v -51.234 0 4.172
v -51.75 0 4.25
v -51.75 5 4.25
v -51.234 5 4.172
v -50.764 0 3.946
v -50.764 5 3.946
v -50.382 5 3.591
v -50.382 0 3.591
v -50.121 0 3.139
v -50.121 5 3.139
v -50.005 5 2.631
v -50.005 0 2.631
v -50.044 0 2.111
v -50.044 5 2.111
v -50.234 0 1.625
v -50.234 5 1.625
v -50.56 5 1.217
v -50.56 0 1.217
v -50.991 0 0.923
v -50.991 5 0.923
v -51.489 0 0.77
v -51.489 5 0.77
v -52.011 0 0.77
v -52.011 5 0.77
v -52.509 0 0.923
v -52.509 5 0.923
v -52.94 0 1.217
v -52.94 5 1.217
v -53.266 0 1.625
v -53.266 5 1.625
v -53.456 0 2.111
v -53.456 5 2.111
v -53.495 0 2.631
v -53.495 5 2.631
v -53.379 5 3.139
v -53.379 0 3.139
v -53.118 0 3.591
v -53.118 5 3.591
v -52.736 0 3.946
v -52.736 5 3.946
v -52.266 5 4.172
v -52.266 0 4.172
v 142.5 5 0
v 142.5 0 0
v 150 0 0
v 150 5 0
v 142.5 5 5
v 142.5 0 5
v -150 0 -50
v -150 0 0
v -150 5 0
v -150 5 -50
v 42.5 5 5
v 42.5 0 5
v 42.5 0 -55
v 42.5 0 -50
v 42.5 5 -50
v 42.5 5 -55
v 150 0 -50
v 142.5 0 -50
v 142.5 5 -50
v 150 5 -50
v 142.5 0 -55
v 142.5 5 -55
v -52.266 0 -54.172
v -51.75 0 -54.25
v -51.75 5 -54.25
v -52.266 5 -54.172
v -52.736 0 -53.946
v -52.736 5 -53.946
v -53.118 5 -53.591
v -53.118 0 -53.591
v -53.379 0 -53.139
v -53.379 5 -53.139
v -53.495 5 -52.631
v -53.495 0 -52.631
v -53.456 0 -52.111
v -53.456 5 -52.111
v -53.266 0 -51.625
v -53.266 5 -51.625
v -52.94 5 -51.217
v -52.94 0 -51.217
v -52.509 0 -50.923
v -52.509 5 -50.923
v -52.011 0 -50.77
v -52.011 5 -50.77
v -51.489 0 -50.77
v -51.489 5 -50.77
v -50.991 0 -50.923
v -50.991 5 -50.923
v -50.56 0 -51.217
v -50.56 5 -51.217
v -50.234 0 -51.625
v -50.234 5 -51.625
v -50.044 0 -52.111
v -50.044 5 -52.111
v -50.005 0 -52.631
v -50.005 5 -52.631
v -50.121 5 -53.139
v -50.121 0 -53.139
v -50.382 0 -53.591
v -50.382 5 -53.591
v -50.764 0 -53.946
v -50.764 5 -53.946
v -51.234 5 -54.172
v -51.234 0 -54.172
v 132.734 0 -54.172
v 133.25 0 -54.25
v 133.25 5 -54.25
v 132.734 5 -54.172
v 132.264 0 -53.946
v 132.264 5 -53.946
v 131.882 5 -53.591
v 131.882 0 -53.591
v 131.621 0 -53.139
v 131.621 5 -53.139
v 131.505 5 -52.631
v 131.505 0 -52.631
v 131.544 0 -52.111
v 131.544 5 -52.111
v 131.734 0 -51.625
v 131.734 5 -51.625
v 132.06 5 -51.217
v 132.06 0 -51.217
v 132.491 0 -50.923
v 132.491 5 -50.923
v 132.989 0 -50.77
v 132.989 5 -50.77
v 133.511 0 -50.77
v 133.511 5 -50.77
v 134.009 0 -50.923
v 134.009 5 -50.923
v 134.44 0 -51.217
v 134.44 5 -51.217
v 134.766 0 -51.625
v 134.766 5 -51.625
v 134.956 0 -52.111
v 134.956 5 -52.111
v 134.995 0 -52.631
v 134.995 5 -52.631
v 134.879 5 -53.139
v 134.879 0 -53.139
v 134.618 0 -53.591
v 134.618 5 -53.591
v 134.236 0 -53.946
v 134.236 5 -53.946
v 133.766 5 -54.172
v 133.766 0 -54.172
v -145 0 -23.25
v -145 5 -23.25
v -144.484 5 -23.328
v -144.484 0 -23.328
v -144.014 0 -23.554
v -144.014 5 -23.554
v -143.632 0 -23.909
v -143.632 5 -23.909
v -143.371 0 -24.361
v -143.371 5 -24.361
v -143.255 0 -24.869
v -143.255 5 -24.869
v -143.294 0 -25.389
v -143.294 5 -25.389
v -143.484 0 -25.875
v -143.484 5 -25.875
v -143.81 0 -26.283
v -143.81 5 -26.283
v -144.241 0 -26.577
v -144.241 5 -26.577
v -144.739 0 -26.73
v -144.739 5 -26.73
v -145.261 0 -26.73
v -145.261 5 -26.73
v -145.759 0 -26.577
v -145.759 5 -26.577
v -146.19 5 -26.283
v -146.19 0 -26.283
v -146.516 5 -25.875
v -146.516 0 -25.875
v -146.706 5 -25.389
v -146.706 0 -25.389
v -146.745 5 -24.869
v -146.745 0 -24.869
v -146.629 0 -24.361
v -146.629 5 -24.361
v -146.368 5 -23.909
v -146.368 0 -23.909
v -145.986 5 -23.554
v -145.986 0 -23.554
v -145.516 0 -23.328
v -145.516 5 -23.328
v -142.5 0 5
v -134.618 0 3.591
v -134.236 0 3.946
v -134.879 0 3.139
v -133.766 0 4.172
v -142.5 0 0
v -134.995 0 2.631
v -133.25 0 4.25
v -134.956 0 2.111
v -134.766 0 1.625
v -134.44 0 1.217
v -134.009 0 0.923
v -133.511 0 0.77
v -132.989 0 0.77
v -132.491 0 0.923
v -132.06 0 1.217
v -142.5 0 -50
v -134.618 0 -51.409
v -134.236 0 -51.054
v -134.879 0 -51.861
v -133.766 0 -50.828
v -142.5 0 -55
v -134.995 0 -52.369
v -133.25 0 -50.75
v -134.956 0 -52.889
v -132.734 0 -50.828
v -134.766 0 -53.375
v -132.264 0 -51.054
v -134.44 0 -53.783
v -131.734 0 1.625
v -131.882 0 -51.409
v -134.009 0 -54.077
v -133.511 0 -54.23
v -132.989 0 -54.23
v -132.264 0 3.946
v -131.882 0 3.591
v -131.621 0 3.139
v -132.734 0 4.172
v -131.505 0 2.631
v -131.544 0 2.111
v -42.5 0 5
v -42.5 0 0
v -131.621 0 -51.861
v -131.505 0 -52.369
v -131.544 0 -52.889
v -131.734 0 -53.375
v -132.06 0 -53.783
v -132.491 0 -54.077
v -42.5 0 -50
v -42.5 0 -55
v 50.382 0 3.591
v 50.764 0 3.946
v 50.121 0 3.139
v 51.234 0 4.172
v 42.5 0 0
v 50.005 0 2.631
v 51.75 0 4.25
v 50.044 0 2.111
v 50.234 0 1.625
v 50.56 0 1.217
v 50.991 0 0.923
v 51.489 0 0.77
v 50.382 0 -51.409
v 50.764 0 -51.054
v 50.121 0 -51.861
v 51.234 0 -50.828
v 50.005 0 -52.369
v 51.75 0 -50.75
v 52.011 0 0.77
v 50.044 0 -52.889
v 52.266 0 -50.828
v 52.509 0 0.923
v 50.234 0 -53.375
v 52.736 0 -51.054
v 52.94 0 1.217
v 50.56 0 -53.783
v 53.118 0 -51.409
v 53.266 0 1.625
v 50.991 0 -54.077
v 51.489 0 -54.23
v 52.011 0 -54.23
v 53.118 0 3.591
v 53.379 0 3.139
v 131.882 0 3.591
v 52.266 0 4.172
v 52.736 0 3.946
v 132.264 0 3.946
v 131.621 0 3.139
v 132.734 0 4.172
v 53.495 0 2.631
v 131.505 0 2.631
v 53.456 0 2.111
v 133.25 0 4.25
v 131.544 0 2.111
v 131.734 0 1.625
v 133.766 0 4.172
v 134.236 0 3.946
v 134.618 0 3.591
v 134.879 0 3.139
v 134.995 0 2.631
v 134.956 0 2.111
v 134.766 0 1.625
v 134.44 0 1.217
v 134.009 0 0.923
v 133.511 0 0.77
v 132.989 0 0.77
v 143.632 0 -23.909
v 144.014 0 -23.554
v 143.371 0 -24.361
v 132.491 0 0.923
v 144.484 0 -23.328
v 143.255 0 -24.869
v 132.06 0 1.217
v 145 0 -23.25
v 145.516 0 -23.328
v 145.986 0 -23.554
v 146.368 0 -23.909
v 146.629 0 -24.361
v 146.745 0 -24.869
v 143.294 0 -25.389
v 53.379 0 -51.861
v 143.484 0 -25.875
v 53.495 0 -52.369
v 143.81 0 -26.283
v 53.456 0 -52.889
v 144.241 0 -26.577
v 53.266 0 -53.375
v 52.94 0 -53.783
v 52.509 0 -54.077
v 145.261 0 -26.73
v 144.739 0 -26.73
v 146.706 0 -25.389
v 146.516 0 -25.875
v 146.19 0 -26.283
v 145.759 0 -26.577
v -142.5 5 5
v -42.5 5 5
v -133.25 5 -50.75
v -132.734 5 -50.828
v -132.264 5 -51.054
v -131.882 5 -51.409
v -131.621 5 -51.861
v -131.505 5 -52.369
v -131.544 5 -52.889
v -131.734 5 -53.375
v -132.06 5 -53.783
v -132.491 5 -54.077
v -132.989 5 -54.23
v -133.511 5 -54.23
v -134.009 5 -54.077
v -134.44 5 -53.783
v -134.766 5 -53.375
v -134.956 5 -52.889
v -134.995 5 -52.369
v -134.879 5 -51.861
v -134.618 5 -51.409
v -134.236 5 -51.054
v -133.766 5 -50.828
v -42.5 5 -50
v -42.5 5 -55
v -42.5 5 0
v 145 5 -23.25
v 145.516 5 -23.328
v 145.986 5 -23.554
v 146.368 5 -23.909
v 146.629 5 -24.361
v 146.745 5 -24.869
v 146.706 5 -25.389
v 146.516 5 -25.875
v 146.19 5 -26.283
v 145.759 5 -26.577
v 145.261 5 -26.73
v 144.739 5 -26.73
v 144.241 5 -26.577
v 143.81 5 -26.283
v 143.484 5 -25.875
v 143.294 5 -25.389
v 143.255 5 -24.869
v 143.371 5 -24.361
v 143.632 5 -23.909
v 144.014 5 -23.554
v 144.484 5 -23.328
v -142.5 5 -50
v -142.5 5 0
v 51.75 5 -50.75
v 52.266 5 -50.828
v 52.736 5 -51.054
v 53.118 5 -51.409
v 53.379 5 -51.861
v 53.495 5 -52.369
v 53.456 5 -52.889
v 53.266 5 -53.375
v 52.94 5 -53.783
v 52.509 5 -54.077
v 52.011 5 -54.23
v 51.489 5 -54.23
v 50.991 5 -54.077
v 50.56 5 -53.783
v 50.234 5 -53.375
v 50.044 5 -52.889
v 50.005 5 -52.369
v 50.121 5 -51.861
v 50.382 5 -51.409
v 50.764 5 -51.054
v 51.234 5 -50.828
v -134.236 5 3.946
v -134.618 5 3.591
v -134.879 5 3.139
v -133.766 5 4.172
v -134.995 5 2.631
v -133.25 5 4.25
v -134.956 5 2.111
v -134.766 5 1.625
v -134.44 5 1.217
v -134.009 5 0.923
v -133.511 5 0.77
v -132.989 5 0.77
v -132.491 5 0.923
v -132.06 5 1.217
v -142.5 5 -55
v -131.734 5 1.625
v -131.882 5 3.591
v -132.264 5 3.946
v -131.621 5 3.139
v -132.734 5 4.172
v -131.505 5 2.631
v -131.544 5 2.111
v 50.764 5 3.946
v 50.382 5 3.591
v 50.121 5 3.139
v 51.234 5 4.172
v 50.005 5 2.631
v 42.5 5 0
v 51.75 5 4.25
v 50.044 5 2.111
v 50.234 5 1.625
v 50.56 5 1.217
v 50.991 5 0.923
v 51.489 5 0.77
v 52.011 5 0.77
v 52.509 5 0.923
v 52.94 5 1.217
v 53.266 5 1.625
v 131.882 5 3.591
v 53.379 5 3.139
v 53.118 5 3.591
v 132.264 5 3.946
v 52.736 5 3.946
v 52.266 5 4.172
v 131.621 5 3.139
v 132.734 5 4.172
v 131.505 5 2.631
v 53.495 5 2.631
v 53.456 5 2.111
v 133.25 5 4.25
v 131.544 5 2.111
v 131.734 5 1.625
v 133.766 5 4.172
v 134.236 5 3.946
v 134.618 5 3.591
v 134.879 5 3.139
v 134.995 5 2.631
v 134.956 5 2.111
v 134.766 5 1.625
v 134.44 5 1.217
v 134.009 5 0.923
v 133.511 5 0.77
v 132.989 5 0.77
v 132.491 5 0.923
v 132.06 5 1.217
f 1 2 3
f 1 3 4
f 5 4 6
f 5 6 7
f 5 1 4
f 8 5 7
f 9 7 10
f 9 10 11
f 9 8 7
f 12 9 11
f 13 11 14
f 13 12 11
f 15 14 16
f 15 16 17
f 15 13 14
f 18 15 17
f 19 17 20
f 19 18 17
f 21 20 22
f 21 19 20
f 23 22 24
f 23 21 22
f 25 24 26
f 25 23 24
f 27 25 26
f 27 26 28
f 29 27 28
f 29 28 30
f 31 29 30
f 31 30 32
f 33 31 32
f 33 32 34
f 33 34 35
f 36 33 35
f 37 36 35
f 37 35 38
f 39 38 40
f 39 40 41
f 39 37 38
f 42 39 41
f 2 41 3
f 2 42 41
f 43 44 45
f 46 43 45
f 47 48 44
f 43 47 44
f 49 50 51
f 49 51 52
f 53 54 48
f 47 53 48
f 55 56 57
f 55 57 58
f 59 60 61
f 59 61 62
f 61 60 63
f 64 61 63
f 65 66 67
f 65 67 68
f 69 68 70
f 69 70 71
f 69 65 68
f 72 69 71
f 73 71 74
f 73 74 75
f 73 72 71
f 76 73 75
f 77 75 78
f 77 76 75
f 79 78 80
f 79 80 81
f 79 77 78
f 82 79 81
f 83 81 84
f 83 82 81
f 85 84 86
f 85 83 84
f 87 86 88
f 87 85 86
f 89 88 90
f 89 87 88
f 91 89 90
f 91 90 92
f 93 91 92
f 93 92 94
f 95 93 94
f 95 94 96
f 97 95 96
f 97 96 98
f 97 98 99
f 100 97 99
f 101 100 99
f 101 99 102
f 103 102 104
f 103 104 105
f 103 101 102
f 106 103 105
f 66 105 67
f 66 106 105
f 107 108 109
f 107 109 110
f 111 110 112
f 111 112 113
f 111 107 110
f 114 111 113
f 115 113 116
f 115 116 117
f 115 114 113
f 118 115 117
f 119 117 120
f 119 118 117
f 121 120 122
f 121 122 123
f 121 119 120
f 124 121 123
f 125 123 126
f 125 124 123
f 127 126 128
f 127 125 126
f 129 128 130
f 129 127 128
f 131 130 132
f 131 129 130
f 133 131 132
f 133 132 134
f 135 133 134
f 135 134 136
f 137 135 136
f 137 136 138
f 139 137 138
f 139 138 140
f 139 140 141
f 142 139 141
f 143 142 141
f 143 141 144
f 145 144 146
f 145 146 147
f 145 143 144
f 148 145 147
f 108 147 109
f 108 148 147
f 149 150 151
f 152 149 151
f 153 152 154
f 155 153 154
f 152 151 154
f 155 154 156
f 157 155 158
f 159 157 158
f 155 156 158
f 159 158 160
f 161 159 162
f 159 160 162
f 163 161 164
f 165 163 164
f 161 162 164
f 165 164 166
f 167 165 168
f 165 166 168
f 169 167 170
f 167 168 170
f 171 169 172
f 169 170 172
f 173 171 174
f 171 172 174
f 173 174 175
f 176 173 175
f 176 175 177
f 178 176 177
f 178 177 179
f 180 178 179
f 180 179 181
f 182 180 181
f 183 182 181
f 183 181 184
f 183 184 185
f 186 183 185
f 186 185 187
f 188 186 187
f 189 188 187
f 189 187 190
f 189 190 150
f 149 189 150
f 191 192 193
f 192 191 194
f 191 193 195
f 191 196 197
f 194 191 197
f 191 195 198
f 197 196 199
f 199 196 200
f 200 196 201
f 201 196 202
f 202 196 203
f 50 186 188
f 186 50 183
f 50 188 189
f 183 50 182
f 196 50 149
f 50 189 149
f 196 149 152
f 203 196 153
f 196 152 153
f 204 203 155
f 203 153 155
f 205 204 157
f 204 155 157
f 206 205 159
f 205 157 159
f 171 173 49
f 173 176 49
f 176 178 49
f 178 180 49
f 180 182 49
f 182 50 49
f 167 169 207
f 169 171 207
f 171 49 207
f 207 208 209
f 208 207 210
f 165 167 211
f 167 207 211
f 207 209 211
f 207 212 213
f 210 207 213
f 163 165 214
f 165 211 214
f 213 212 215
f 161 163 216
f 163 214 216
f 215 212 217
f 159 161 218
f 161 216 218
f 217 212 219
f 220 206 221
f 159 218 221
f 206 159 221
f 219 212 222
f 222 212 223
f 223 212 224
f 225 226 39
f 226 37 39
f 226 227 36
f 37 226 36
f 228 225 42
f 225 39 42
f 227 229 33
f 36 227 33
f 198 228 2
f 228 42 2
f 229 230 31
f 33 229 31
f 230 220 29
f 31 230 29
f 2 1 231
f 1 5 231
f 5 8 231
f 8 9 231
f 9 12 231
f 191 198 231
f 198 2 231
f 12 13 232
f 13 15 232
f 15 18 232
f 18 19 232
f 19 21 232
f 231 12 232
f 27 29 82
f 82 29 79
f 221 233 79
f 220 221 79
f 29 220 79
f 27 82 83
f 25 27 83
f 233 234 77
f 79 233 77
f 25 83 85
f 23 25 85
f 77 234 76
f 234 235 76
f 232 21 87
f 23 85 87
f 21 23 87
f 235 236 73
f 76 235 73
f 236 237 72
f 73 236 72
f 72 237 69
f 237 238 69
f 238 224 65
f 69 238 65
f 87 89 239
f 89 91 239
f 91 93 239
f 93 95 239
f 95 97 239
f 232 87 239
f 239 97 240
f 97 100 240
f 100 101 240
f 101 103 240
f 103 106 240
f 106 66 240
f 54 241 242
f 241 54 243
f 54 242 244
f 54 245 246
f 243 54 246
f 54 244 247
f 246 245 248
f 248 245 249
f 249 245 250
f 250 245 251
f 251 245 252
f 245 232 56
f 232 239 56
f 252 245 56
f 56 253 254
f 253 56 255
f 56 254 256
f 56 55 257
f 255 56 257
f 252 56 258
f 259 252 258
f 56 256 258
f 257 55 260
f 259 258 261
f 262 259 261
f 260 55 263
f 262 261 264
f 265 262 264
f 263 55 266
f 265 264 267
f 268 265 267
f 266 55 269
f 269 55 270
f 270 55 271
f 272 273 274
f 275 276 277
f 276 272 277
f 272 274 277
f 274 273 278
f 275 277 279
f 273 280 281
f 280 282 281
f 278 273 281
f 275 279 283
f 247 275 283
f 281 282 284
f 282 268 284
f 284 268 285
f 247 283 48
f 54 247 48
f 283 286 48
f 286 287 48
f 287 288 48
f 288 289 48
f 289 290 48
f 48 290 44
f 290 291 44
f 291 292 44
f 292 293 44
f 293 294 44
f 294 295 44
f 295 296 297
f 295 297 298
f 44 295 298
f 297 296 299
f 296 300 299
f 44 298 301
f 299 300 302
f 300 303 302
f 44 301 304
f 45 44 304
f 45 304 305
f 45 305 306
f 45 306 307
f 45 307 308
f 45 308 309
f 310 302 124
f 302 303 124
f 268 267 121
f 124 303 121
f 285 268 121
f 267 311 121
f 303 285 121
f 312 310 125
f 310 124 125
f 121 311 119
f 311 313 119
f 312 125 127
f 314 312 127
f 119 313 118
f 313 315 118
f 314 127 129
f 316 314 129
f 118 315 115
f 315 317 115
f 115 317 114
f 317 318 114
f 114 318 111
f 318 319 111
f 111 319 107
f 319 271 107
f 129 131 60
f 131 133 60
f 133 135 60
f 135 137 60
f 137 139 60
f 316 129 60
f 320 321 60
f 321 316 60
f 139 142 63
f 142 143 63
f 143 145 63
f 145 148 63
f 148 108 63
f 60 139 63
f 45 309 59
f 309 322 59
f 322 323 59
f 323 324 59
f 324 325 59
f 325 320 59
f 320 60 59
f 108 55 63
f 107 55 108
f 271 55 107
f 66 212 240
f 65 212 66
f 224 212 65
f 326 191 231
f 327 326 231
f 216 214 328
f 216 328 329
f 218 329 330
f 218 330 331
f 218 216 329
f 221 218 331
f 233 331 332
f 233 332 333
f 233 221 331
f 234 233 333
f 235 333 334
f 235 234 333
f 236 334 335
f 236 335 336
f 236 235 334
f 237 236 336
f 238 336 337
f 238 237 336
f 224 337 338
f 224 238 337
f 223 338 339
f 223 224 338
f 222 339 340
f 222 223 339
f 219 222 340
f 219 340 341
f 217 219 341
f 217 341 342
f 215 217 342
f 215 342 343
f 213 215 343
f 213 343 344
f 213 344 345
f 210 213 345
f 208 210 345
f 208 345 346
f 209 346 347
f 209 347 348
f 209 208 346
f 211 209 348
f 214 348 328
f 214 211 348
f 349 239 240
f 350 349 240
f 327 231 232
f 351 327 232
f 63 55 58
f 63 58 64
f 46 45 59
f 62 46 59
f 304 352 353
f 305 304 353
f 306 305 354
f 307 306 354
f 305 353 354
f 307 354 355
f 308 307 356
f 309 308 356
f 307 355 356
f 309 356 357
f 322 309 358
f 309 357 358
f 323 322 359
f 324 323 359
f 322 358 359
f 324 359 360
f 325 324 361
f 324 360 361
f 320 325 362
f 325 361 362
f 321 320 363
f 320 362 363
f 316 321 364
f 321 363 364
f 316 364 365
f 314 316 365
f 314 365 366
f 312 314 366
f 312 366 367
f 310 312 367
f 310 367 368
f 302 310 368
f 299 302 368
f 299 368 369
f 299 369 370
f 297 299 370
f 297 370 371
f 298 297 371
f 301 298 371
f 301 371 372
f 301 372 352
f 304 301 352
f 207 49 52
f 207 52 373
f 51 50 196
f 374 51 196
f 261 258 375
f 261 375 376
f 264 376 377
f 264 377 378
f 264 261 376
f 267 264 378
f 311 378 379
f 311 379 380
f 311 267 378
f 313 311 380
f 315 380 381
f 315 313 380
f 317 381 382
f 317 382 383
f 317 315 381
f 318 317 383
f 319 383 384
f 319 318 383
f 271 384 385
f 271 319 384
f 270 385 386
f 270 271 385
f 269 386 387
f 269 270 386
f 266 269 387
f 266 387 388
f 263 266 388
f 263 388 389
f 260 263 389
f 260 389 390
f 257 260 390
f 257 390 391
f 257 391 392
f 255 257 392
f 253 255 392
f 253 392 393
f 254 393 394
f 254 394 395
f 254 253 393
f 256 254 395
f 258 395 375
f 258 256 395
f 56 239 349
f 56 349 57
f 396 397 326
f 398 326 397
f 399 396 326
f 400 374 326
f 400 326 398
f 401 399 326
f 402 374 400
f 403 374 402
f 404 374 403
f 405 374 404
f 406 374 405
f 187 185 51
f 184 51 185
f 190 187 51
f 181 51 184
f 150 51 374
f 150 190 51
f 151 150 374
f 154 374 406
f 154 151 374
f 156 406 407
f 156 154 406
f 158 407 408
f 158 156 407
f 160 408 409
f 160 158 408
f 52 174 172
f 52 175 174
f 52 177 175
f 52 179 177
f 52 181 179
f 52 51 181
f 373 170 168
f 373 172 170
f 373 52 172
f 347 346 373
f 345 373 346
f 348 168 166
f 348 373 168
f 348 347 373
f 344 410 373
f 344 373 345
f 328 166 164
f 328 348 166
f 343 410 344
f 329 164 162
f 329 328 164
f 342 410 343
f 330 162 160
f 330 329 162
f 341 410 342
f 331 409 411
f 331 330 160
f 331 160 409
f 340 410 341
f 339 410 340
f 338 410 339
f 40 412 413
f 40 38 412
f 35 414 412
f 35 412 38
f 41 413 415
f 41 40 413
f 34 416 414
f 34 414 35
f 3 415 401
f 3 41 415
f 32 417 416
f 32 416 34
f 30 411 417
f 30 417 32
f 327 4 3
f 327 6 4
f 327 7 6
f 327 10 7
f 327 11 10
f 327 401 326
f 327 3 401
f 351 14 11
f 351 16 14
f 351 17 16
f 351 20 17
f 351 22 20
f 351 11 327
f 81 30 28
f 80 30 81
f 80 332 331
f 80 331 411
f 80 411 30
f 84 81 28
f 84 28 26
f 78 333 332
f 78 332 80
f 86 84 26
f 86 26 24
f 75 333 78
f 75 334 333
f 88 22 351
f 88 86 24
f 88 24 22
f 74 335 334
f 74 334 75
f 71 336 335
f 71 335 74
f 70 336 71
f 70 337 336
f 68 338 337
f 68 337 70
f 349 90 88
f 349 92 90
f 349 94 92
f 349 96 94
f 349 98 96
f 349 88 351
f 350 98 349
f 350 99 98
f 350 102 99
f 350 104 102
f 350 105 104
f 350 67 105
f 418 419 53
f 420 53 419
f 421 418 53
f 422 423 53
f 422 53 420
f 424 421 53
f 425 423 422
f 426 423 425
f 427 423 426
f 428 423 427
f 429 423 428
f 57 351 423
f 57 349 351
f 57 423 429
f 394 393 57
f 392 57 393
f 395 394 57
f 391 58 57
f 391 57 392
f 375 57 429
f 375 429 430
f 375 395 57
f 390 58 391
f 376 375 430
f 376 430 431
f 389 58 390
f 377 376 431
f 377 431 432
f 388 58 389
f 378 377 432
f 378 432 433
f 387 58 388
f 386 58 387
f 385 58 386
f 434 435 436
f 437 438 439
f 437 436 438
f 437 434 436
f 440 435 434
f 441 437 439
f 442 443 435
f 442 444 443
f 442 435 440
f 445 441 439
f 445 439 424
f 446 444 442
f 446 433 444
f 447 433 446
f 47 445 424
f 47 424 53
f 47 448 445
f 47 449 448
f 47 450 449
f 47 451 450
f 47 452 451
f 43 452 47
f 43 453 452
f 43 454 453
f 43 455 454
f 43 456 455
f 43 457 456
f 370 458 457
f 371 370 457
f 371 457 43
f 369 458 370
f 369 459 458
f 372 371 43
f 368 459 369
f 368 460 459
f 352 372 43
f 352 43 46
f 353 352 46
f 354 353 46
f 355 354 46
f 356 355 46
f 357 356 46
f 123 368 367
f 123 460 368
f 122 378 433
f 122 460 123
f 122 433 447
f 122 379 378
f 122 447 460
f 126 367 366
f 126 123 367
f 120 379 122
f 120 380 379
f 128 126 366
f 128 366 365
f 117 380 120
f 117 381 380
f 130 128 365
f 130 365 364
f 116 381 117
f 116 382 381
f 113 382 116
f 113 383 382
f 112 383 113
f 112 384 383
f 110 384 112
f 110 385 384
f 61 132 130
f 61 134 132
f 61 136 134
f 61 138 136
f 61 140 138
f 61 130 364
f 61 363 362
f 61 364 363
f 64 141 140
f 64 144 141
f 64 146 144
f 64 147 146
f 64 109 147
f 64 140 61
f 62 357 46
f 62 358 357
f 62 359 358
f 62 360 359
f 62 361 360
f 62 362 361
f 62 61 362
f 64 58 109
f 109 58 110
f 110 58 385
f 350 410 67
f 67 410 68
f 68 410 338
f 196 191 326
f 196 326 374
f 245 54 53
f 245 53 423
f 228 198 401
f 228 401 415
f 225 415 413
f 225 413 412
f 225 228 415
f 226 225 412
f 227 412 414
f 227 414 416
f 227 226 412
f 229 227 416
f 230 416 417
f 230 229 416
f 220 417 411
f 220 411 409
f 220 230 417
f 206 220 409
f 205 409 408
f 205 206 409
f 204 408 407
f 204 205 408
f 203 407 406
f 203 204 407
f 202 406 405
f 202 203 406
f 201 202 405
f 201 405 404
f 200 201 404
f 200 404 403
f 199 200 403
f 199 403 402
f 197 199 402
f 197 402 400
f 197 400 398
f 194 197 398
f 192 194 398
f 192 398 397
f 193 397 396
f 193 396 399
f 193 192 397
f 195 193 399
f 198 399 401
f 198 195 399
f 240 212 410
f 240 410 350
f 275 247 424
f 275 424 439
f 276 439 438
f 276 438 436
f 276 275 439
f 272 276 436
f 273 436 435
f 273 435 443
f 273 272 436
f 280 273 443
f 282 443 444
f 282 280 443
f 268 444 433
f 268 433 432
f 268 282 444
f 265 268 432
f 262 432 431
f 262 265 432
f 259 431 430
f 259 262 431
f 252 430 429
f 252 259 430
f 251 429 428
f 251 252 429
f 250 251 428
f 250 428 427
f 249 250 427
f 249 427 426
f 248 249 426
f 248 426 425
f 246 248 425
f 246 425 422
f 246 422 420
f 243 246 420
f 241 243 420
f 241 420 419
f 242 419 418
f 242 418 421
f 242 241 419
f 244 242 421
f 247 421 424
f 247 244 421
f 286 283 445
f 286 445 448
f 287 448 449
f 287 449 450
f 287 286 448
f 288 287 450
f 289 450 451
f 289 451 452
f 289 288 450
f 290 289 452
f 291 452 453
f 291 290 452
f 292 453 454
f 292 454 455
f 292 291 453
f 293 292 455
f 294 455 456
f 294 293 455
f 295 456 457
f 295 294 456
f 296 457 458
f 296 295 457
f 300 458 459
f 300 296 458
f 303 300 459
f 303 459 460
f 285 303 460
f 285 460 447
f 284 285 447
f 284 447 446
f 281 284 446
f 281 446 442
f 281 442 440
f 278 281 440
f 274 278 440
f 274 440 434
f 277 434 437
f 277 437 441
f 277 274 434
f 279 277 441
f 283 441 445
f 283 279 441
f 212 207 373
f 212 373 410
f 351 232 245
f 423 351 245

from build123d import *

# Parameters (mm, degrees)
SKETCH1_W           = 100
SKETCH1_H           = 5
SKETCH1_R           = 1.75
SKETCH1_W_2         = 300
SKETCH1_H_2         = 50
BOSS_EXTRUDE1_DEPTH = 5
SKETCH2_R           = 1.75
CUT_EXTRUDE1_DEPTH  = 10


with BuildPart() as part:
    # Sketch1 → Boss-Extrude1 (new body)
    # profile 1 of 5: a face of its own
    with BuildSketch(Plane(origin=(0, 0, 0), x_dir=(1, 0, 0), z_dir=(0, 1, 0))):
        with Locations((-92.5, -2.5)):
            Rectangle(SKETCH1_W, SKETCH1_H)
        with Locations(Location((-51.75, -2.5, 0), (0, 0, 270))):
            Circle(SKETCH1_R, mode=Mode.SUBTRACT)
        with Locations(Location((-133.25, -2.5, 0), (0, 0, 270))):
            Circle(SKETCH1_R, mode=Mode.SUBTRACT)
    # profile 2 of 5: a face of its own
    with BuildSketch(Plane(origin=(0, 0, 0), x_dir=(1, 0, 0), z_dir=(0, 1, 0))):
        with Locations((0, 25)):
            Rectangle(SKETCH1_W_2, SKETCH1_H_2)
    # profile 3 of 5: a face of its own
    with BuildSketch(Plane(origin=(0, 0, 0), x_dir=(1, 0, 0), z_dir=(0, 1, 0))):
        with Locations((92.5, -2.5)):
            Rectangle(SKETCH1_W, SKETCH1_H)
        with Locations(Location((51.75, -2.5, 0), (0, 0, 270))):
            Circle(SKETCH1_R, mode=Mode.SUBTRACT)
        with Locations(Location((133.25, -2.5, 0), (0, 0, 270))):
            Circle(SKETCH1_R, mode=Mode.SUBTRACT)
    # profile 4 of 5: a face of its own
    with BuildSketch(Plane(origin=(0, 0, 0), x_dir=(1, 0, 0), z_dir=(0, 1, 0))):
        with Locations((92.5, 52.5)):
            Rectangle(SKETCH1_W, SKETCH1_H)
        with Locations(Location((133.25, 52.5, 0), (0, 0, 90))):
            Circle(SKETCH1_R, mode=Mode.SUBTRACT)
        with Locations(Location((51.75, 52.5, 0), (0, 0, 270))):
            Circle(SKETCH1_R, mode=Mode.SUBTRACT)
    # profile 5 of 5: a face of its own
    with BuildSketch(Plane(origin=(0, 0, 0), x_dir=(1, 0, 0), z_dir=(0, 1, 0))):
        with Locations((-92.5, 52.5)):
            Rectangle(SKETCH1_W, SKETCH1_H)
        with Locations(Location((-51.75, 52.5, 0), (0, 0, 90))):
            Circle(SKETCH1_R, mode=Mode.SUBTRACT)
        with Locations(Location((-133.25, 52.5, 0), (0, 0, 270))):
            Circle(SKETCH1_R, mode=Mode.SUBTRACT)
    extrude(amount=BOSS_EXTRUDE1_DEPTH)

    # Sketch2 → Cut-Extrude1 (cut)
    with BuildSketch(Plane(origin=(0, 5, 0), x_dir=(1, 0, 0), z_dir=(0, 1, 0))):
        with Locations(Location((-145, 25, 0), (0, 0, 270))):
            Circle(SKETCH2_R)
        with Locations(Location((145, 25, 0), (0, 0, 270))):
            Circle(SKETCH2_R)
    extrude(amount=-CUT_EXTRUDE1_DEPTH, mode=Mode.SUBTRACT)


solid = part.part
